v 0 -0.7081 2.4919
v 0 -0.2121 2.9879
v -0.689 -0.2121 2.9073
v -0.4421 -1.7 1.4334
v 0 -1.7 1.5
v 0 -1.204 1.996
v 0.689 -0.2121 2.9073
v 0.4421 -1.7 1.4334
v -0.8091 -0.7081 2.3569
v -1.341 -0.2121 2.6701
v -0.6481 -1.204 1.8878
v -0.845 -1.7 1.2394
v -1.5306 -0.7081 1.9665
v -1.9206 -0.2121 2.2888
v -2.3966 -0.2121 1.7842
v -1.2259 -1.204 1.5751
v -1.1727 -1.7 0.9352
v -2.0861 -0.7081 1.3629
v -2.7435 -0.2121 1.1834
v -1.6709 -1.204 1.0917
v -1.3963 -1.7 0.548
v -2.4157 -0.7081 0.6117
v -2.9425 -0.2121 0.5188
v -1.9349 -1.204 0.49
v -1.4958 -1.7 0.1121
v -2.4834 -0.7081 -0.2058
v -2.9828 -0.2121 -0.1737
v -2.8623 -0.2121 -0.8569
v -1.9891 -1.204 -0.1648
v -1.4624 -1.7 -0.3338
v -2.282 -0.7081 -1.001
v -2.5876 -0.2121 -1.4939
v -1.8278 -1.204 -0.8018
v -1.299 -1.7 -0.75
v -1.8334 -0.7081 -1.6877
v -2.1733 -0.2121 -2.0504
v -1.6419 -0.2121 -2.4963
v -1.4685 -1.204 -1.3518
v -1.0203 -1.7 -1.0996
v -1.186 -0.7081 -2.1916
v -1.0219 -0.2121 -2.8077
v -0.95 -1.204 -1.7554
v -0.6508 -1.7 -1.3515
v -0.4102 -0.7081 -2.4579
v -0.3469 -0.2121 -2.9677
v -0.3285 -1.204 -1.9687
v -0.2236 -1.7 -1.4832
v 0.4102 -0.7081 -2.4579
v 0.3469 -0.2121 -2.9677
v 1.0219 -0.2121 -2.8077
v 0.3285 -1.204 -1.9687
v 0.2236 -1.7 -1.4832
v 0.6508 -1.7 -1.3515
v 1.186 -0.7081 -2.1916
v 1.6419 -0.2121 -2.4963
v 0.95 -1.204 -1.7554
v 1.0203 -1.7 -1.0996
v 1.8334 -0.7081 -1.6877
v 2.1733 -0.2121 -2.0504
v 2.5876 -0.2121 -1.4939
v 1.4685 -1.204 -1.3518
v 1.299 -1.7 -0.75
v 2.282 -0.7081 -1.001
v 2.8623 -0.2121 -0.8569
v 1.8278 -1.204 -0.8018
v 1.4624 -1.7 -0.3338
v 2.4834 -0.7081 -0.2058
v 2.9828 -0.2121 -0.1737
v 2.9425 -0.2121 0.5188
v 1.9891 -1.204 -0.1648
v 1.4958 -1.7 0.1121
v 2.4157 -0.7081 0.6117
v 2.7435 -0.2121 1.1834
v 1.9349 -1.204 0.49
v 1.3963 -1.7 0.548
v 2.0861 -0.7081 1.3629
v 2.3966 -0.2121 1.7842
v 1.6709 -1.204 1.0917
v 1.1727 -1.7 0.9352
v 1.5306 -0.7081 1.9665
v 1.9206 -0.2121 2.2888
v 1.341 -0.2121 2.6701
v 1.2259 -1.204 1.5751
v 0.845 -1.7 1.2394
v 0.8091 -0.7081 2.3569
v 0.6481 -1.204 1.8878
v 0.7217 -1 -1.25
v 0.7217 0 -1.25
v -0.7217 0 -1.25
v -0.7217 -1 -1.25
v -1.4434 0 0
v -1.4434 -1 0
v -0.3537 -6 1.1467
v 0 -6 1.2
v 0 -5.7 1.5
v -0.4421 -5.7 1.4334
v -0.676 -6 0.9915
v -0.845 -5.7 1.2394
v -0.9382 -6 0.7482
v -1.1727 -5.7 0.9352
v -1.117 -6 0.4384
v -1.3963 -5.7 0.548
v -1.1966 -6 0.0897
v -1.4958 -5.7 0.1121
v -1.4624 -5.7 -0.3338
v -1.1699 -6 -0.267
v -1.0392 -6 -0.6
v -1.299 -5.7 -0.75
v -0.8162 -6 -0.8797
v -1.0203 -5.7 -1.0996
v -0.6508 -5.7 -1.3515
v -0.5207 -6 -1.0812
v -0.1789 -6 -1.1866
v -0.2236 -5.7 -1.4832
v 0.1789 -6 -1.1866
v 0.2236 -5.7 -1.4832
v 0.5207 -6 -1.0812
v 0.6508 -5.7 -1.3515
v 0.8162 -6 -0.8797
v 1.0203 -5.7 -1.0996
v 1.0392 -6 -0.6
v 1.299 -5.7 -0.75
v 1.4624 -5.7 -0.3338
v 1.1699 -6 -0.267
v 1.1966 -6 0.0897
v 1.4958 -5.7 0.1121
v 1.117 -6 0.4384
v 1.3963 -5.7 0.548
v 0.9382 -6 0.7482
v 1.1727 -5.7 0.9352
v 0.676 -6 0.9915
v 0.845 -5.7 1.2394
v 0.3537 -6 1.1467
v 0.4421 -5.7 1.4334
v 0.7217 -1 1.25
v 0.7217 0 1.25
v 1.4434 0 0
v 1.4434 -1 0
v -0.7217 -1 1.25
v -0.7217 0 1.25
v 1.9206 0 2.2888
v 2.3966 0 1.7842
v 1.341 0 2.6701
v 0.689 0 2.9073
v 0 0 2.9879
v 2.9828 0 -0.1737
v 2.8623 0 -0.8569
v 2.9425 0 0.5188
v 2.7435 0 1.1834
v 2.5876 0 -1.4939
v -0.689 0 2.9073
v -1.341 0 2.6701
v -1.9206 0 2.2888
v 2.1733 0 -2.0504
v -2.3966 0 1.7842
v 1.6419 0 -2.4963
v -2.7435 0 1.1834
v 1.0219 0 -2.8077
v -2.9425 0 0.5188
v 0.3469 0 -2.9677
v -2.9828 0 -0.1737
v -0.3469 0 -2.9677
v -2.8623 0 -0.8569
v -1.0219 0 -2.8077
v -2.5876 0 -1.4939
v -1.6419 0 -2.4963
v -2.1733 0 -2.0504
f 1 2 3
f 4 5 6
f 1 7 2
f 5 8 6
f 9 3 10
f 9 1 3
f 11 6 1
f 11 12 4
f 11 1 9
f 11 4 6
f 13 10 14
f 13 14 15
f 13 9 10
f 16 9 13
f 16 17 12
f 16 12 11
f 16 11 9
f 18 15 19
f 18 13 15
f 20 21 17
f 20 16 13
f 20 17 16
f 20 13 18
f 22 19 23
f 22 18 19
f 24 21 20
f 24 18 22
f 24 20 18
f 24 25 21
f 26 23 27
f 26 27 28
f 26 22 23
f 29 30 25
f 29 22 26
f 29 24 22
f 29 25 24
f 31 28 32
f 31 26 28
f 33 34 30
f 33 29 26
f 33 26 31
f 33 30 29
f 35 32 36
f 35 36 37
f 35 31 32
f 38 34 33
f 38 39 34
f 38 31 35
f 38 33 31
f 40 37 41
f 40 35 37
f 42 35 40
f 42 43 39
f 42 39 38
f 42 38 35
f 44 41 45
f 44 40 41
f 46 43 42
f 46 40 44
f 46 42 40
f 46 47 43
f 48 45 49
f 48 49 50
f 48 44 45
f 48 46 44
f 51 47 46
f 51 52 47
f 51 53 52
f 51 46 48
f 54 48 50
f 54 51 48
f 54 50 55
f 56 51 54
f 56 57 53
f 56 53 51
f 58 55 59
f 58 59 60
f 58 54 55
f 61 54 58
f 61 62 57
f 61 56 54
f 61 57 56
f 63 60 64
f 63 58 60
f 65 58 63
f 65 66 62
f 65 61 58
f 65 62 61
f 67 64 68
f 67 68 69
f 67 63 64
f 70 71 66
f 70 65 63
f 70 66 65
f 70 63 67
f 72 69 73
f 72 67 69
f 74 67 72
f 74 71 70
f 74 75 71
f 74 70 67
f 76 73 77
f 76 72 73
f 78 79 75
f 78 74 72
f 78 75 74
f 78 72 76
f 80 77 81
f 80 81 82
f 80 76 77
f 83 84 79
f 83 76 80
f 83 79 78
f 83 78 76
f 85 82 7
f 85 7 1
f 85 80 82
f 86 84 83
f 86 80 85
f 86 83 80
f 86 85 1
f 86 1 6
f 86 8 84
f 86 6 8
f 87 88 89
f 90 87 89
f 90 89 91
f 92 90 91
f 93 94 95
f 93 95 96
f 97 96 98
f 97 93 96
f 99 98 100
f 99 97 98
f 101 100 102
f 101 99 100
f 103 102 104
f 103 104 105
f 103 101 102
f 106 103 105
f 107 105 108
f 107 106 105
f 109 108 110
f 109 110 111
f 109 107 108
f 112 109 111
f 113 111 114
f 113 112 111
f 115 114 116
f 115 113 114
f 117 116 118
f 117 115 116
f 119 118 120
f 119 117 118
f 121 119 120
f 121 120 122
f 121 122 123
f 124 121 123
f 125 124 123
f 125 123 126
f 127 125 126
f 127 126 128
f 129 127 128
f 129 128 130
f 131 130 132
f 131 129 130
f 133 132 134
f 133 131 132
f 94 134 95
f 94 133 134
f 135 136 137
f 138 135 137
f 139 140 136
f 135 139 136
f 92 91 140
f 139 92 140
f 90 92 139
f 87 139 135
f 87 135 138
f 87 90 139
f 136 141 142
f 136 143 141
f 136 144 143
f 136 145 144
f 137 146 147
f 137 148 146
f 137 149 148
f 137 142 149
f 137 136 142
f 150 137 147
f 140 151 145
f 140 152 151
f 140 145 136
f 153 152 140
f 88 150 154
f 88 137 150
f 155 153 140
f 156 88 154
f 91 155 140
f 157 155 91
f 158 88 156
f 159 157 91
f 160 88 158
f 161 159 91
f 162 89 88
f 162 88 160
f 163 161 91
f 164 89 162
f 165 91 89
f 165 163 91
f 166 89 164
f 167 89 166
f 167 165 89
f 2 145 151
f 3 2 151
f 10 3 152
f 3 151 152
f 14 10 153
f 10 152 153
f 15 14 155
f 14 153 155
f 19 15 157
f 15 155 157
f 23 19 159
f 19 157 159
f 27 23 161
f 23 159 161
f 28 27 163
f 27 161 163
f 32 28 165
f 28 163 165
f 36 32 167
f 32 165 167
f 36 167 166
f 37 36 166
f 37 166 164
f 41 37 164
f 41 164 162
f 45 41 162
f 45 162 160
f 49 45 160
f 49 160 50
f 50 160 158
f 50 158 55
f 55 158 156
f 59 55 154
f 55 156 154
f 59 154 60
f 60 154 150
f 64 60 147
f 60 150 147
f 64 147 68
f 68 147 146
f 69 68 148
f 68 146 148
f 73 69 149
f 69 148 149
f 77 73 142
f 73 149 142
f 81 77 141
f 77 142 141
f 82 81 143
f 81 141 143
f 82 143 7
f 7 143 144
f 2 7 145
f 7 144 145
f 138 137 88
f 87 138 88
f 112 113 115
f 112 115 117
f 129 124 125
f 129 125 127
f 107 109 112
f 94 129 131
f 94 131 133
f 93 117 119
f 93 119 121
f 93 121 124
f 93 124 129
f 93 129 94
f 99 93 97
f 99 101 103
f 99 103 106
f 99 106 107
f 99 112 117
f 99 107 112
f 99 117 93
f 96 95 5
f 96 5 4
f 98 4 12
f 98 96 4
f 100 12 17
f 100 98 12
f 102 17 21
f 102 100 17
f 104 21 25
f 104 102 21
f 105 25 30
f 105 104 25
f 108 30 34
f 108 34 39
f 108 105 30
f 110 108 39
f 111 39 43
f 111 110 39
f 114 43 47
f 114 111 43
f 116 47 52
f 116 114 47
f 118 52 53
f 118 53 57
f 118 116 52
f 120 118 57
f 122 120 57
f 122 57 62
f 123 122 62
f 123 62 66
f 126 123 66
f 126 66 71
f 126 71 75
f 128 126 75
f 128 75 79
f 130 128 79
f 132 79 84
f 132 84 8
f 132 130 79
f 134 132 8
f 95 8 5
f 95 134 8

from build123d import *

# Parameters (mm, degrees)
CHAFL_N2_SIZE         = 0.3
CHAFL_N2_SIZE2        = 0.212132034
CHAFL_N3_SIZE         = 0.3
CORTAR_EXTRUIR2_DEPTH = 1


with BuildPart() as part:
    # Croquis1 → Revolución1 (revolve)
    with BuildSketch(Plane.XY, mode=Mode.PRIVATE) as revoluci_n1_sk:
        Polygon((0, 0), (3.2, 0), (1.5, -1.7), (1.5, -6), (0, -6), align=None)
    revolve(revoluci_n1_sk.sketch.rotate(Axis((0, 0, 0), (0, -1, 0)), 90), axis=Axis((0, 0, 0), (0, -1, 0)))

    # Chaflán2
    chafl_n2_edges = [part.edges().sort_by_distance(p)[0] for p in [
        (0, 0, -3.2),
    ]]
    chafl_n2_side = [part.faces().sort_by_distance(p)[0] for p in [
        (0, -0.85, -2.35),
    ]]
    chamfer(chafl_n2_edges, length=CHAFL_N2_SIZE, length2=CHAFL_N2_SIZE2, reference=chafl_n2_side[0])

    # Chaflán3
    chafl_n3_edges = [part.edges().sort_by_distance(p)[0] for p in [
        (0, -6, -1.5),
    ]]
    chamfer(chafl_n3_edges, length=CHAFL_N3_SIZE)

    # Croquis3 → Cortar-Extruir2 (cut)
    with BuildSketch(Plane(origin=(0, 0, 0), x_dir=(1, 0, 0), z_dir=(0, 1, 0))):
        Polygon((-0.721687836, 1.25), (-1.443375673, 0), (-0.721687836, -1.25), (0.721687836, -1.25), (1.443375673, 0), (0.721687836, 1.25), align=None)
    extrude(amount=-CORTAR_EXTRUIR2_DEPTH, mode=Mode.SUBTRACT)


solid = part.part
